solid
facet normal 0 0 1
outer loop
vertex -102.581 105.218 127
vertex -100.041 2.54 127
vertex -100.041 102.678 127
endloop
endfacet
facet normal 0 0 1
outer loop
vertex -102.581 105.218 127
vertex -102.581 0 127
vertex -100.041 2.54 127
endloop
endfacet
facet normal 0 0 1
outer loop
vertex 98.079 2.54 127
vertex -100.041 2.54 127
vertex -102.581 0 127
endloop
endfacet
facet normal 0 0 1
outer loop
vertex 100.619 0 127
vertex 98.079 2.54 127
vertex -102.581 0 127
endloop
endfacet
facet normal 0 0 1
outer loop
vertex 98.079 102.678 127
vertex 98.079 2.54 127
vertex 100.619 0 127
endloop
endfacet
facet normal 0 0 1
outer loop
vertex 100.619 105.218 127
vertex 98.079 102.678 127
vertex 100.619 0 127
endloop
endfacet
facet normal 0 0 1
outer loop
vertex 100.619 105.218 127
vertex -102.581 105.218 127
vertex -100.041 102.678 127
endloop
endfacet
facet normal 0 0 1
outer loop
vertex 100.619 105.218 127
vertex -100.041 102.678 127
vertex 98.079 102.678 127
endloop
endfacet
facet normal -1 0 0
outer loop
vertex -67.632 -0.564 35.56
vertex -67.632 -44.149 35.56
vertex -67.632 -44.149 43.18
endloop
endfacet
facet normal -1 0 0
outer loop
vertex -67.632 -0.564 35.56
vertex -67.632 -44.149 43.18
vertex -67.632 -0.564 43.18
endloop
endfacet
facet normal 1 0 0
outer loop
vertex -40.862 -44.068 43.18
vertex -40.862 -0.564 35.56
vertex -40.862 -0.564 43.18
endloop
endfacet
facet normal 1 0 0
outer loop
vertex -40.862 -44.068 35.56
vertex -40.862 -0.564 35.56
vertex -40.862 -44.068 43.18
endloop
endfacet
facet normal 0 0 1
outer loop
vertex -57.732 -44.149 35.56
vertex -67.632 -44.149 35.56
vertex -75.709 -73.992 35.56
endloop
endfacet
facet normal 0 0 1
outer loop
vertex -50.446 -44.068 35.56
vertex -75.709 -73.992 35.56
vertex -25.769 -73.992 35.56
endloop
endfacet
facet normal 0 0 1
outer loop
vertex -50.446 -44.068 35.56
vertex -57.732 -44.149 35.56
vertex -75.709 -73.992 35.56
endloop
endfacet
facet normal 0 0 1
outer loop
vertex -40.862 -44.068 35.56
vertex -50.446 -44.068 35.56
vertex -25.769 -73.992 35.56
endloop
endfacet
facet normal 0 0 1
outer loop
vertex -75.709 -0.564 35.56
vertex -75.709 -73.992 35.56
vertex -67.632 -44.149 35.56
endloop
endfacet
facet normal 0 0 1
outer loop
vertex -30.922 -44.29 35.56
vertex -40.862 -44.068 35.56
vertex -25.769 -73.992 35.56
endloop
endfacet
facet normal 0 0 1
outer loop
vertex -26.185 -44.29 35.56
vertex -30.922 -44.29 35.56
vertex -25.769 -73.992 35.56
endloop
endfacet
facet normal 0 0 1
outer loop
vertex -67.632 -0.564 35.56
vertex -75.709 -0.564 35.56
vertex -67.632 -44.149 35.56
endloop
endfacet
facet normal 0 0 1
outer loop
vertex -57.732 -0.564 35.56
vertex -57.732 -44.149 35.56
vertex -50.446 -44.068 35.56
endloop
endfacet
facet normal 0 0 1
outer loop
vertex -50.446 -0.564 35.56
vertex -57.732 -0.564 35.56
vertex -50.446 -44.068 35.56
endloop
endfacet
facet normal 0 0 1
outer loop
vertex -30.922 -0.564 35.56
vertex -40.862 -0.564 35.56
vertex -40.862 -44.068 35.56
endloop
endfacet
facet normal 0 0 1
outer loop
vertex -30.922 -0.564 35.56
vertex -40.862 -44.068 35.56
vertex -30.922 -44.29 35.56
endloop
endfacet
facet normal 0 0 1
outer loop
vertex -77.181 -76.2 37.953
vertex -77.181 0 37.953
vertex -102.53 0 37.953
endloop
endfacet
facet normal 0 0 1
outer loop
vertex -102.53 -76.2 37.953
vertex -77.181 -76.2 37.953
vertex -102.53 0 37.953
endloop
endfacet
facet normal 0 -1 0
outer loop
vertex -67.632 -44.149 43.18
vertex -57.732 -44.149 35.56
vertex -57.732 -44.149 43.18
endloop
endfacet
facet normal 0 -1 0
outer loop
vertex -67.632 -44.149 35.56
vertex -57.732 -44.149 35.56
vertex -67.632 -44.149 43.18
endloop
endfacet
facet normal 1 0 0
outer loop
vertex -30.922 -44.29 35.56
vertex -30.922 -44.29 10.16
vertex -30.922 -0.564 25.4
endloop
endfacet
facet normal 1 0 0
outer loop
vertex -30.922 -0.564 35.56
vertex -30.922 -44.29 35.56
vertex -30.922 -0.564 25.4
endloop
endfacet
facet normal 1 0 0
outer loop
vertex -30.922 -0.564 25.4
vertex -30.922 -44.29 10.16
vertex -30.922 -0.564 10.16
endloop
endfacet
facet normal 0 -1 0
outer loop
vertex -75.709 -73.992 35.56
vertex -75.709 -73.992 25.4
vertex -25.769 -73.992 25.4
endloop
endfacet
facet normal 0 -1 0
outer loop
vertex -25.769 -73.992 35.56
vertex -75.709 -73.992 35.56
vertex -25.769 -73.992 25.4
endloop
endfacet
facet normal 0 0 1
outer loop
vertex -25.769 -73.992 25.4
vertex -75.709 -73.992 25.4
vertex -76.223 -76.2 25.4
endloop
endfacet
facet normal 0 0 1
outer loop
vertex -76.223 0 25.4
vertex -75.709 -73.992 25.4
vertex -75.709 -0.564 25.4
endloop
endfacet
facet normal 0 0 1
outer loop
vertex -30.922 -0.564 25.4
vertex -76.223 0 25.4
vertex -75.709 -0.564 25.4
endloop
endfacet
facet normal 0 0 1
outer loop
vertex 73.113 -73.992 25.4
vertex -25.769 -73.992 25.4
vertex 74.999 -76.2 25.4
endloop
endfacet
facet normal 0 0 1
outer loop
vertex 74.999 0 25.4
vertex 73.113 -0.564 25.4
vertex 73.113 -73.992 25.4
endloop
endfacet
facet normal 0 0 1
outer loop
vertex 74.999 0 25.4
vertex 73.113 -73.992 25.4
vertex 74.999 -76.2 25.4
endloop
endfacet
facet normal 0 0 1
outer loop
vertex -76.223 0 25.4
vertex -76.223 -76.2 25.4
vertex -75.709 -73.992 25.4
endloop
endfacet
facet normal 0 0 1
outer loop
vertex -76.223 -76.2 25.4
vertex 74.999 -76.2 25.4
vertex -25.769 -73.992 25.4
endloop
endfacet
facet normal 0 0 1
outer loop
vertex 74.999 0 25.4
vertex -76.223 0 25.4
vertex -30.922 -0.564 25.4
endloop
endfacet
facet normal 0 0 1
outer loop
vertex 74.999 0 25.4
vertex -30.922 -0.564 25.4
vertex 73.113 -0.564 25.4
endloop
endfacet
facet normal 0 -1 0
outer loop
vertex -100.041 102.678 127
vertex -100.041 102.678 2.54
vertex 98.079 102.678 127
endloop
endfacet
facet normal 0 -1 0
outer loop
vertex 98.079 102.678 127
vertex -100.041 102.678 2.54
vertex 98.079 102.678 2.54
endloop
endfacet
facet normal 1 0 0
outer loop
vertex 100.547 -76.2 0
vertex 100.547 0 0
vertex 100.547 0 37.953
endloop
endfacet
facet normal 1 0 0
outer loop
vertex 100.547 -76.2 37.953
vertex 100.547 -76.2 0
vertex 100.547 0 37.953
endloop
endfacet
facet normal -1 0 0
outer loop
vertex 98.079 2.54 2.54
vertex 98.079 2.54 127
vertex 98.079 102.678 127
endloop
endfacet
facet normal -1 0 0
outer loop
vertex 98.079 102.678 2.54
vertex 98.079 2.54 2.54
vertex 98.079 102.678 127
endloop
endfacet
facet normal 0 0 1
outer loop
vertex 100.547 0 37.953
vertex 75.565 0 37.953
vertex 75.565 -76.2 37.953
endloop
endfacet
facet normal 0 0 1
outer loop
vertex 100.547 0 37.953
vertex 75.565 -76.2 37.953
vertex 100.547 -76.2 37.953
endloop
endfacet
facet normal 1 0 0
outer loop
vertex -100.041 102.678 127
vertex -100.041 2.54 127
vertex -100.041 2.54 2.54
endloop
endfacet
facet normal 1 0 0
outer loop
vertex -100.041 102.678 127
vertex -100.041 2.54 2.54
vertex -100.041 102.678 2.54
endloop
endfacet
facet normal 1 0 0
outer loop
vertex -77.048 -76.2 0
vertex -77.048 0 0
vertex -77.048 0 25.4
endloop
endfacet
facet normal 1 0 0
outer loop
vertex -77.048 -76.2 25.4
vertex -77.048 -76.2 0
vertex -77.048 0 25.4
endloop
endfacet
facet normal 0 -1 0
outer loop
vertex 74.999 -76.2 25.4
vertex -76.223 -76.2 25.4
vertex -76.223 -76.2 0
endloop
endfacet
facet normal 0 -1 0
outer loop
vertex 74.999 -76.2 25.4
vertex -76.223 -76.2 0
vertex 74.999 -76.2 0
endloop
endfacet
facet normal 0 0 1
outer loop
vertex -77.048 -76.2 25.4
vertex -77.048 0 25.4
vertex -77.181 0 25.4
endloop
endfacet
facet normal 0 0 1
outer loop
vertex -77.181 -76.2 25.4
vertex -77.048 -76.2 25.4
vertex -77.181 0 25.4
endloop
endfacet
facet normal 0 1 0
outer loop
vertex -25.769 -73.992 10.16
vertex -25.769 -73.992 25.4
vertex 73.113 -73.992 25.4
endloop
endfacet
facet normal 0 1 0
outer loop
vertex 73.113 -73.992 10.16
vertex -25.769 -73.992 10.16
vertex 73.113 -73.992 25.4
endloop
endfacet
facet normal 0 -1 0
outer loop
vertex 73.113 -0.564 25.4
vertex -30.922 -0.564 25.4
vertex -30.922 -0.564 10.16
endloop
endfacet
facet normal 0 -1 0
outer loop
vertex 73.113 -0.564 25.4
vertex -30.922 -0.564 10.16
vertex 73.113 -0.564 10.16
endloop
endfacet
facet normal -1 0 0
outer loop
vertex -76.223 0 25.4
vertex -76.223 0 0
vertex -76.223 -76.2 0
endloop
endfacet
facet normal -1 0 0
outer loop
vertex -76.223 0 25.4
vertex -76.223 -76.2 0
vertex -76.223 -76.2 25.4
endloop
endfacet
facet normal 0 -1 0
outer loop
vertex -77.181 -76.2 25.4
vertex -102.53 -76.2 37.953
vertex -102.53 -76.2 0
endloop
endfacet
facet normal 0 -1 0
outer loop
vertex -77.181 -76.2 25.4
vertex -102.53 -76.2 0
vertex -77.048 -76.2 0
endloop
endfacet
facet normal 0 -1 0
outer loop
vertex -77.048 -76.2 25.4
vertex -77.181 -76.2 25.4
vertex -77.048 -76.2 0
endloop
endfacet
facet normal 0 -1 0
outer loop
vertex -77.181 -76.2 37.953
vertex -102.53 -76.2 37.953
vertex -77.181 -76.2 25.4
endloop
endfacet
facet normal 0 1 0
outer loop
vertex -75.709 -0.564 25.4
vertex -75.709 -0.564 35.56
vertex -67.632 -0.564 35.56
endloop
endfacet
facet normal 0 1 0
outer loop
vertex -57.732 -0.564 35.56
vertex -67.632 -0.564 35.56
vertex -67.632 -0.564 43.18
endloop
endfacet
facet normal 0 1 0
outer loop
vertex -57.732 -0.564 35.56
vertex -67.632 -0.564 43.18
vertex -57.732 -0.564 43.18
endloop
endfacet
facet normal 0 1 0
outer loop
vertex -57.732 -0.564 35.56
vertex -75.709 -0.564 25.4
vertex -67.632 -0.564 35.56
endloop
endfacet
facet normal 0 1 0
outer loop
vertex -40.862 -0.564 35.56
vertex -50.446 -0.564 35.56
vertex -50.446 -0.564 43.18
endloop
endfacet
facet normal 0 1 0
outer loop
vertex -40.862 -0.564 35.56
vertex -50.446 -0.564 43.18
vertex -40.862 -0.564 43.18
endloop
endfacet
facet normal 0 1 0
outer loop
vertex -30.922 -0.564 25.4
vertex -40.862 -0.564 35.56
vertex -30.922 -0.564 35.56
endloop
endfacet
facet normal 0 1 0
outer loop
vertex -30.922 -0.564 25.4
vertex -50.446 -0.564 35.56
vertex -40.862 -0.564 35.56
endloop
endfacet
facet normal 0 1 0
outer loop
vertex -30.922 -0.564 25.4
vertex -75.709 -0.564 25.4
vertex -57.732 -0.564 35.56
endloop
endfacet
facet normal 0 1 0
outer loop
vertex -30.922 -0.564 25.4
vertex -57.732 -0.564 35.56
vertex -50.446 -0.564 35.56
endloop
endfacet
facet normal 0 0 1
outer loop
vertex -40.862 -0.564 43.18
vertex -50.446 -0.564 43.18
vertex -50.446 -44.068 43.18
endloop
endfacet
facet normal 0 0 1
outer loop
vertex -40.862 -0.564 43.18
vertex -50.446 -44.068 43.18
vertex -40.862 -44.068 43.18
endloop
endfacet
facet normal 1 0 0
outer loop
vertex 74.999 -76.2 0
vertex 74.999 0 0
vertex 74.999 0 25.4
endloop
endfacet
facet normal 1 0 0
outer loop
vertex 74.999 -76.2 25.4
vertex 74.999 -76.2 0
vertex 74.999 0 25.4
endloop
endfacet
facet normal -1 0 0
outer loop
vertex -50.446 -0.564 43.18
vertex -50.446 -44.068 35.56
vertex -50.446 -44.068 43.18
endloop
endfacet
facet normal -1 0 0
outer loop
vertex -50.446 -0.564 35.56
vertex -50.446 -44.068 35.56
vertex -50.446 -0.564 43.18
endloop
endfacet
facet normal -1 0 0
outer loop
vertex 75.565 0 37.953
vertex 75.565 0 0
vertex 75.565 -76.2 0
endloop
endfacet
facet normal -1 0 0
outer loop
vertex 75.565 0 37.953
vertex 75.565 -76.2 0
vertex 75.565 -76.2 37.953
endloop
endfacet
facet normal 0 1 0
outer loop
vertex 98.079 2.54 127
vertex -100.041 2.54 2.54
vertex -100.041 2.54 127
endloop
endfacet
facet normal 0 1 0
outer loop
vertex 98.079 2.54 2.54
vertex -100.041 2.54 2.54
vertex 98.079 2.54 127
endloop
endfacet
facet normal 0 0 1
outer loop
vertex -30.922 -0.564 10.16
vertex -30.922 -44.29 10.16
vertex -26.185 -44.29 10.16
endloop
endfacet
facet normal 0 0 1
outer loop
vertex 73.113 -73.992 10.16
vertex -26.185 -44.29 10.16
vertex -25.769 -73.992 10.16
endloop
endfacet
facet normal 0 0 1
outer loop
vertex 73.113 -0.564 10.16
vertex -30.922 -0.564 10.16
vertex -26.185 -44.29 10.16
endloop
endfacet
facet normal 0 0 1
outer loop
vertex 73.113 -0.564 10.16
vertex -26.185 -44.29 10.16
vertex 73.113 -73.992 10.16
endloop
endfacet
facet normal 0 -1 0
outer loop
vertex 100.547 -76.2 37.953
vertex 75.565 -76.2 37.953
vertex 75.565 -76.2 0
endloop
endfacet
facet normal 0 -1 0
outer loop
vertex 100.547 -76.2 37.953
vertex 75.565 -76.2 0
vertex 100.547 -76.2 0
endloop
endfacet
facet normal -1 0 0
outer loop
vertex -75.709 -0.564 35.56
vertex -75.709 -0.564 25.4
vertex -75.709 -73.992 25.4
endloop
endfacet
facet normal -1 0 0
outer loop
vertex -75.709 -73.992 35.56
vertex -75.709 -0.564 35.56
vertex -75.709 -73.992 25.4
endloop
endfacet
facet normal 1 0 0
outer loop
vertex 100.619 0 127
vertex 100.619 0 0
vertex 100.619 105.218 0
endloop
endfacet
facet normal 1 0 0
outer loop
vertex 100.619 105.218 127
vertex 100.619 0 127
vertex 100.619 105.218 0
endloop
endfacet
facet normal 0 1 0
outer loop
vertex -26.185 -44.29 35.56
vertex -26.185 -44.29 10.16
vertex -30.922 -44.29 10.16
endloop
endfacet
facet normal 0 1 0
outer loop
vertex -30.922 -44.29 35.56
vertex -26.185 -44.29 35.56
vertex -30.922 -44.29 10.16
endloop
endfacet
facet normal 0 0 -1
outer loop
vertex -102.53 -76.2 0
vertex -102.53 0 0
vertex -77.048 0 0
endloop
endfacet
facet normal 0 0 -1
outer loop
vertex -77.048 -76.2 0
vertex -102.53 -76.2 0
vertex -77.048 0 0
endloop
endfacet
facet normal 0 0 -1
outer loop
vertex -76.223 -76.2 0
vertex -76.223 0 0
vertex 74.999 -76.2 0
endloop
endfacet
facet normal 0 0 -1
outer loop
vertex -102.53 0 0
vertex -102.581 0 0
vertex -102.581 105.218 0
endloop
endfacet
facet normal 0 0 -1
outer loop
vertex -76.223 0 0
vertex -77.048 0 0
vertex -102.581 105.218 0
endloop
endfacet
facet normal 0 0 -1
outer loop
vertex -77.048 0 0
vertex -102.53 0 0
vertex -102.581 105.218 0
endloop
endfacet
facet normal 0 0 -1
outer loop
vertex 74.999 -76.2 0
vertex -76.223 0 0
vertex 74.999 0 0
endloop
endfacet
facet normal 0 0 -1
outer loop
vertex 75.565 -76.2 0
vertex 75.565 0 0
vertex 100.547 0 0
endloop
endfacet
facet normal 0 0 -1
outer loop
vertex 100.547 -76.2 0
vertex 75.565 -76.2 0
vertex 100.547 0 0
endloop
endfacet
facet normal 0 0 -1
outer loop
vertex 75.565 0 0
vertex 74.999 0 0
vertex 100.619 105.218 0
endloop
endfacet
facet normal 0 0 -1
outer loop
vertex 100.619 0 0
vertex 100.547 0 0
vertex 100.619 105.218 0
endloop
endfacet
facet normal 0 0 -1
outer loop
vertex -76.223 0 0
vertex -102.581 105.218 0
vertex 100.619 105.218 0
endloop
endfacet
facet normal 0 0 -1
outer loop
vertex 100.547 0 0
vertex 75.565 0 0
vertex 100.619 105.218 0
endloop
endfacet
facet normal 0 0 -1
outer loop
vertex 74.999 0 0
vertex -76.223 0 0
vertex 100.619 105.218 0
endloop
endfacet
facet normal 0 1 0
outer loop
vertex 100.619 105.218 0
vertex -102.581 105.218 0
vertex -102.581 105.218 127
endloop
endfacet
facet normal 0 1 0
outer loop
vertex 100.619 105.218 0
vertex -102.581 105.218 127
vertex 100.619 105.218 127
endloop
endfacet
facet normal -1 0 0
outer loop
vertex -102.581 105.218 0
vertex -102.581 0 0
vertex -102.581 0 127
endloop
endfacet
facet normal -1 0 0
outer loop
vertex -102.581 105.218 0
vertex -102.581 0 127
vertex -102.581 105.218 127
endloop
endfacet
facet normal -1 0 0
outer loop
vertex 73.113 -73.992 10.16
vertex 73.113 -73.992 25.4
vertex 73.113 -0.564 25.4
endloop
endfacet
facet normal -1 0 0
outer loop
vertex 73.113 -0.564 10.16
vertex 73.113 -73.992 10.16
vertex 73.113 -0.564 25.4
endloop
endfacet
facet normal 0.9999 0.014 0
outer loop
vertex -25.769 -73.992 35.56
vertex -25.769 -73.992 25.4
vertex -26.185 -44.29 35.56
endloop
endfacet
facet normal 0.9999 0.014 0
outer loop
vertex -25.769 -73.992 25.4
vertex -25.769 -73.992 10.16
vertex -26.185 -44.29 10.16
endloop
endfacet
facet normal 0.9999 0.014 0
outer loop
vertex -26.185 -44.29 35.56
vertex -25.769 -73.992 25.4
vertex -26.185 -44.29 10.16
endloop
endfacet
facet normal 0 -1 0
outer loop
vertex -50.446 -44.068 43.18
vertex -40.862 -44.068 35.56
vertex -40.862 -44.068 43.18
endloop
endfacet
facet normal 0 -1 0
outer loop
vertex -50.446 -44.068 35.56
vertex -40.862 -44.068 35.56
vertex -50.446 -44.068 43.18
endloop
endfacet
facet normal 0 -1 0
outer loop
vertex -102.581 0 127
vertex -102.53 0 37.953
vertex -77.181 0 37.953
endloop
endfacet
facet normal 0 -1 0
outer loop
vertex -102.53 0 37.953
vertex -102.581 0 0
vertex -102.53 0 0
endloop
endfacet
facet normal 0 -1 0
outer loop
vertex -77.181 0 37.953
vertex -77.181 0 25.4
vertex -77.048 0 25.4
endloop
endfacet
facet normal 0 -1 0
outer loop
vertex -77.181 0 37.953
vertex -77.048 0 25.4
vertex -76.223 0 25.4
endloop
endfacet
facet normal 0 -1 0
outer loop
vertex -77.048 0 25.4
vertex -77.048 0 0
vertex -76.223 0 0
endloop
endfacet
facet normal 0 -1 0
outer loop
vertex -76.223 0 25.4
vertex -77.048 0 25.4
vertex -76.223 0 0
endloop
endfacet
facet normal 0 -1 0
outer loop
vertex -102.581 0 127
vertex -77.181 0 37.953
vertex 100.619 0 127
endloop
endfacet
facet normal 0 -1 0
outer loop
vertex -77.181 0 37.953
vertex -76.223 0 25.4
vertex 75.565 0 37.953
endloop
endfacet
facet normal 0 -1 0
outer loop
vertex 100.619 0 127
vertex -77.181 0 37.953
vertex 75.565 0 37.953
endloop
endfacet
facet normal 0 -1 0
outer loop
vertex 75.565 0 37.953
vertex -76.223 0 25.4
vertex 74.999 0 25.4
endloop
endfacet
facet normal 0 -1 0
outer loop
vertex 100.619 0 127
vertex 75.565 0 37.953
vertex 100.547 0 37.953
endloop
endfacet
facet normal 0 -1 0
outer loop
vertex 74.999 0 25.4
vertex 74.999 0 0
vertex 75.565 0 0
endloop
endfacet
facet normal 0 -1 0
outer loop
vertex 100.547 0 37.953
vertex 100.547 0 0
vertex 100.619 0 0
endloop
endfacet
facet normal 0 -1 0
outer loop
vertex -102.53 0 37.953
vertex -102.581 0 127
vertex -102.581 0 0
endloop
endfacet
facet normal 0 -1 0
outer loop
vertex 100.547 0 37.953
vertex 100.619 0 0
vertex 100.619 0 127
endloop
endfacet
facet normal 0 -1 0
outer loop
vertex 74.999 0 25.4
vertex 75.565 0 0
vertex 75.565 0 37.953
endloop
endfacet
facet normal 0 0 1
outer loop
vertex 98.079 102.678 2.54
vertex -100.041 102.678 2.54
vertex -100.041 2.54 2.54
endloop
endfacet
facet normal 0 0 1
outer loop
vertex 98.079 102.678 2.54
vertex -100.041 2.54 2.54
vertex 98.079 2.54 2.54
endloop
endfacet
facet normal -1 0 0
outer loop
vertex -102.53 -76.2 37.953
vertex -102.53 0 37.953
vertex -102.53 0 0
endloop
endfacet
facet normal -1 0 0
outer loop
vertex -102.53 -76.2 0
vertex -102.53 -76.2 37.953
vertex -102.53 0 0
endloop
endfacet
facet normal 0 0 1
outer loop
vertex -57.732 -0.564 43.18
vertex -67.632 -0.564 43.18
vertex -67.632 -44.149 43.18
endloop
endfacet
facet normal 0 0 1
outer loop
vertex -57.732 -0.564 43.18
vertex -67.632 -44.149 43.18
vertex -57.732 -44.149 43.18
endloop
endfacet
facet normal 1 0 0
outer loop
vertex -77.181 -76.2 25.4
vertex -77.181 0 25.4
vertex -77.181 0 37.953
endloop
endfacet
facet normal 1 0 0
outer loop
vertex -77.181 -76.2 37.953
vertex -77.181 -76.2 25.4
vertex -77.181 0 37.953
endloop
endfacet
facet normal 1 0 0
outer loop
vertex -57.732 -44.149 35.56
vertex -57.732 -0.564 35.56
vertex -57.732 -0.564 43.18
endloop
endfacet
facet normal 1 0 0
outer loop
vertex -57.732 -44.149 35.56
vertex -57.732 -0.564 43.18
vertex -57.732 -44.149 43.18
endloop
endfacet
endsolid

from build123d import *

# Parameters (mm, degrees)
F0_W      = 203.2
F0_H      = 105.2184881944
F1_DEPTH  = 127
F2_T      = -2.54
F4_W      = 24.9819085002
F4_H      = 37.9526205361
F4_W_2    = 151.2214764953
F4_H_2    = 25.4
F5_DEPTH  = 76.2
F6_W      = 148.822195828
F6_H      = 73.4275504947
F7_DEPTH  = 15.24
F9_DEPTH  = 25.4
F10_DEPTH = 33.02


with BuildPart() as f1:
    # F0 (on Top) → F1 (new body)
    with BuildSketch(Plane.XY):
        with Locations((-0.9812270495, 52.6092440972)):
            Rectangle(F0_W, F0_H)
    extrude(amount=F1_DEPTH)

    # F2
    f2_openings = [f1.faces().sort_by_distance(p)[0] for p in [
        (-0.981227, 52.609244, 127),
    ]]
    offset(amount=F2_T, openings=f2_openings)

    # F4 (on face) → F5 (join)
    with BuildSketch(Plane.XZ):
        Polygon((-77.0476683974, 0), (-77.0476683974, 25.4), (-77.1812270495, 25.4), (-77.1812270495, 37.9526205361), (-102.5303602219, 37.9526205361), (-102.5303602219, 0), align=None)
        with Locations((88.0557782948, 18.976310268)):
            Rectangle(F4_W, F4_H)
        with Locations((-0.6120987236, 12.7)):
            Rectangle(F4_W_2, F4_H_2)
    extrude(amount=F5_DEPTH)

    # F6 (on face) → F7 (cut)
    with BuildSketch(Plane.XY.offset(25.4)):
        with Locations((-1.2982971966, -37.2778810561)):
            Rectangle(F6_W, F6_H)
    extrude(amount=-F7_DEPTH, mode=Mode.SUBTRACT)

    # F8 (on face) → F9 (join)
    with BuildSketch(Plane.XY.offset(10.16)):
        Polygon((-50.4458248615, -0.5641058087), (-57.7319078147, -0.5641058087), (-57.7319078147, -44.1493541002), (-59.9848367274, -44.1493541002), (-59.9848367274, -73.9916563034), (-48.2489354908, -73.9916563034), (-48.2489354908, -44.0681837499), (-50.4458248615, -44.0681837499), align=None)
        Polygon((-67.6321908832, -44.1493541002), (-67.6321908832, -0.5641058087), (-75.7093951106, -0.5641058087), (-75.7093951106, -73.9916563034), (-59.9848367274, -73.9916563034), (-59.9848367274, -44.1493541002), align=None)
        Polygon((-30.921860598, -0.5641058087), (-36.0744632781, -0.5641058087), (-36.0744632781, -73.9916563034), (-25.769257918, -73.9916563034), (-26.1848908849, -44.2901365459), (-30.921860598, -44.2901365459), align=None)
        Polygon((-36.0744632781, -0.5641058087), (-40.8624187112, -0.5641058087), (-40.8624187112, -44.0681837499), (-48.2489354908, -44.0681837499), (-48.2489354908, -73.9916563034), (-36.0744632781, -73.9916563034), align=None)
    extrude(amount=F9_DEPTH)

    # F10 (add): faces of the model
    f10_faces = [f1.faces().sort_by_distance(p)[0] for p in [
        (-62.682049349, -22.3567299545, 10.16),
        (-45.6541217864, -22.3161447793, 10.16),
    ]]
    extrude(f10_faces, amount=F10_DEPTH)


solid = f1.part
